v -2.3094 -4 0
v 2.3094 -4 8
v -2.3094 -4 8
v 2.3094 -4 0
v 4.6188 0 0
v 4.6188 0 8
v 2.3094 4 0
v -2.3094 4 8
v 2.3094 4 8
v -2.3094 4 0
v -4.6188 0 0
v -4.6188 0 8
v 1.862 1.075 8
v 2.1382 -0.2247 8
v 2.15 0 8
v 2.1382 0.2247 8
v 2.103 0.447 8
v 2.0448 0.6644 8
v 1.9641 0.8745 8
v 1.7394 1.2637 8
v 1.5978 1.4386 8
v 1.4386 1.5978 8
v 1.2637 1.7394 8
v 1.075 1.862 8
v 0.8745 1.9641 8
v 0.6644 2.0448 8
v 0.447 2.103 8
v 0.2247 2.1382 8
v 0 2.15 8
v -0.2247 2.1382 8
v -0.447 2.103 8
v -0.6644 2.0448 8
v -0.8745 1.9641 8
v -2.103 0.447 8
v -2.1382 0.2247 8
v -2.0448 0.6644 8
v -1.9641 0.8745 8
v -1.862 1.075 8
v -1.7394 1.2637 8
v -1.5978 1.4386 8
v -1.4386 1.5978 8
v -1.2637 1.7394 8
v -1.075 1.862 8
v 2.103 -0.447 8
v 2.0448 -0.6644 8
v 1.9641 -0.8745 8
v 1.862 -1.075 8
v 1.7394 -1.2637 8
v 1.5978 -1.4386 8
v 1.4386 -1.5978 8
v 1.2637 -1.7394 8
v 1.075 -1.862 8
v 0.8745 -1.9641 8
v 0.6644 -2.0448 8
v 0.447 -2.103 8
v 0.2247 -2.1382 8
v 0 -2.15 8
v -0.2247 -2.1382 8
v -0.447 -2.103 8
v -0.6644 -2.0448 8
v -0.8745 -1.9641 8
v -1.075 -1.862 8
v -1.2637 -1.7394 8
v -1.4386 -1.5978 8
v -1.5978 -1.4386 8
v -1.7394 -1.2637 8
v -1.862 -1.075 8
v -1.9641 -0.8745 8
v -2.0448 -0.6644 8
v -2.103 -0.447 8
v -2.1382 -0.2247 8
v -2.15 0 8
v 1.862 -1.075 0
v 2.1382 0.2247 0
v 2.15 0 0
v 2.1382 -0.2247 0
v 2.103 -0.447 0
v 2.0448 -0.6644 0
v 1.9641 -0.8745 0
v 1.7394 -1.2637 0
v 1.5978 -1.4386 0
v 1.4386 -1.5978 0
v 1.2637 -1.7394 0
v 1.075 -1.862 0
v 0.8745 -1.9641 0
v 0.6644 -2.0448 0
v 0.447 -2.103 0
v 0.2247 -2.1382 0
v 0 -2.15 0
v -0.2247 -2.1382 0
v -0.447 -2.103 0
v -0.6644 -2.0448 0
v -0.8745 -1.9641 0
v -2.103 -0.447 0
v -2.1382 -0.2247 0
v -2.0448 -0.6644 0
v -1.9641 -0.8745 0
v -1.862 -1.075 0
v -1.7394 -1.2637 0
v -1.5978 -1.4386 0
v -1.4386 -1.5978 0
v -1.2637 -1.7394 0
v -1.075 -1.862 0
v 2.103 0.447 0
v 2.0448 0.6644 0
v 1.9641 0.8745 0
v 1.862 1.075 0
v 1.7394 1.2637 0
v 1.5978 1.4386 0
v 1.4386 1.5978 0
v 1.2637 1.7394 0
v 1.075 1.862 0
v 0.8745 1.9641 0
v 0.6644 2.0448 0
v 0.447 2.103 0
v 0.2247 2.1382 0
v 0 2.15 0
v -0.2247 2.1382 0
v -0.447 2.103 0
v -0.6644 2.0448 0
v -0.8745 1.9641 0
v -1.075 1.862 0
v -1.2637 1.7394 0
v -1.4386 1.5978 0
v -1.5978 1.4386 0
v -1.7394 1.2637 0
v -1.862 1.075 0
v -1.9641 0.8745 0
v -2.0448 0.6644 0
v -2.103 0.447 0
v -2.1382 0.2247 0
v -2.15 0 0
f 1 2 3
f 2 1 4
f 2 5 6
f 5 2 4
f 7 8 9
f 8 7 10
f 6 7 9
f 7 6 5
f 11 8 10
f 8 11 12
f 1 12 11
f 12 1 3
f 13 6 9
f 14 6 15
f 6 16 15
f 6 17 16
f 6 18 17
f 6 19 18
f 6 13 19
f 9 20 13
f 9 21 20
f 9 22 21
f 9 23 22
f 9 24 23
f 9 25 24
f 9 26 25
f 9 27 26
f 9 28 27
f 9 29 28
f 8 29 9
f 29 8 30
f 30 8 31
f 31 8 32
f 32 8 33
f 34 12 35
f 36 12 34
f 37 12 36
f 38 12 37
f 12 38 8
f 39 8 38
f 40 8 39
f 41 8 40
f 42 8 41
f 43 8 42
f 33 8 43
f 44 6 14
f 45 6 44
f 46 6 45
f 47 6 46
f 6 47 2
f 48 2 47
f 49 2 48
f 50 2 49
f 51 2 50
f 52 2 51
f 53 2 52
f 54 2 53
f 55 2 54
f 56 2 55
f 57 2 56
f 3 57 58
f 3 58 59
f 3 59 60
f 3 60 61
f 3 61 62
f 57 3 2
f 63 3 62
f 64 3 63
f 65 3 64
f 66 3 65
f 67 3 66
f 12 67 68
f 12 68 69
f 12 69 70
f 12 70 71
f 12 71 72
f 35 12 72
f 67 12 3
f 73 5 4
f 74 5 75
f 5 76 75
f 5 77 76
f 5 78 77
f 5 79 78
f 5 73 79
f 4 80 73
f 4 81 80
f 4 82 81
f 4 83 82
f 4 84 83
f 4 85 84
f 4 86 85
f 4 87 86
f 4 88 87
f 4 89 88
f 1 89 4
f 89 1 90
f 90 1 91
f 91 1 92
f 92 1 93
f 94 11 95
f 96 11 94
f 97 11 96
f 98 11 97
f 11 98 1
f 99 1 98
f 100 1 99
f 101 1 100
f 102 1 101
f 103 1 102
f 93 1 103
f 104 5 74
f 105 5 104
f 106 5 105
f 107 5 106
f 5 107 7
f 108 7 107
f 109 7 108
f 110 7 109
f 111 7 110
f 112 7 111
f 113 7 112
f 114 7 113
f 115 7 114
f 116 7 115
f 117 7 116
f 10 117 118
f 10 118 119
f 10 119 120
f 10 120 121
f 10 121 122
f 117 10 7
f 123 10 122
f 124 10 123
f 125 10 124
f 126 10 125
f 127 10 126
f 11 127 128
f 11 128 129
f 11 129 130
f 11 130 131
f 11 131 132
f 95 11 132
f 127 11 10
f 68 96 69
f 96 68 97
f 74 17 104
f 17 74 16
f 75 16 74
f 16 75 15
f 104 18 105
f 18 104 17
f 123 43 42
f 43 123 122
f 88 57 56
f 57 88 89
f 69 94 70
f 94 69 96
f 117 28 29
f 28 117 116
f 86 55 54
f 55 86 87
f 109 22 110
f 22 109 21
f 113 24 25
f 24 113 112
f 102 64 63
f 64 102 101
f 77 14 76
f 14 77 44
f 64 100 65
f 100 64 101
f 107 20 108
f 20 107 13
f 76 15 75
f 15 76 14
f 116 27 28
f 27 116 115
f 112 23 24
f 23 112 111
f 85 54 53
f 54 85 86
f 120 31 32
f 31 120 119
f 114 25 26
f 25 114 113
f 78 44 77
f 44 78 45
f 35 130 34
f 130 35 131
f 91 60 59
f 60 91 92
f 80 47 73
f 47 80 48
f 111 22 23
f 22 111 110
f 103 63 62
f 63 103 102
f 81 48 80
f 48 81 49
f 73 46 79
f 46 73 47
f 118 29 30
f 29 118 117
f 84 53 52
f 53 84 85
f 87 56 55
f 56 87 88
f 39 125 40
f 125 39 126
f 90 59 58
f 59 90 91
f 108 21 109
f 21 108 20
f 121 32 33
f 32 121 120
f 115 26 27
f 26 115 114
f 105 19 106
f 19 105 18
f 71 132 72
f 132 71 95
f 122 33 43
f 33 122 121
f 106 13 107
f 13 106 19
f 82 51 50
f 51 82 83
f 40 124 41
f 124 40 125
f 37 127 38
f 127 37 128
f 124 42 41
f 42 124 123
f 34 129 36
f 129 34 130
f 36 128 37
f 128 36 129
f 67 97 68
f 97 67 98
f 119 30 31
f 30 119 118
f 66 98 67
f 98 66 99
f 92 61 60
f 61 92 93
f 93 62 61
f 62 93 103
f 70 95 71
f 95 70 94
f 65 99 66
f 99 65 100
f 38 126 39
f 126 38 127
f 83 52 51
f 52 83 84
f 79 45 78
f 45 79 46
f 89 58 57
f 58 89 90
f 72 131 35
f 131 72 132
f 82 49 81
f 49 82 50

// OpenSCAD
// Hex spacer.
$fn = 60;
eps = 0.02;
inner_d = 4.3;
flat = 8;
length = 8;
difference() { cylinder(d=flat/cos(30),h=length,$fn=6); translate([0,0,-eps]) cylinder(d=inner_d,h=length+2*eps); }
